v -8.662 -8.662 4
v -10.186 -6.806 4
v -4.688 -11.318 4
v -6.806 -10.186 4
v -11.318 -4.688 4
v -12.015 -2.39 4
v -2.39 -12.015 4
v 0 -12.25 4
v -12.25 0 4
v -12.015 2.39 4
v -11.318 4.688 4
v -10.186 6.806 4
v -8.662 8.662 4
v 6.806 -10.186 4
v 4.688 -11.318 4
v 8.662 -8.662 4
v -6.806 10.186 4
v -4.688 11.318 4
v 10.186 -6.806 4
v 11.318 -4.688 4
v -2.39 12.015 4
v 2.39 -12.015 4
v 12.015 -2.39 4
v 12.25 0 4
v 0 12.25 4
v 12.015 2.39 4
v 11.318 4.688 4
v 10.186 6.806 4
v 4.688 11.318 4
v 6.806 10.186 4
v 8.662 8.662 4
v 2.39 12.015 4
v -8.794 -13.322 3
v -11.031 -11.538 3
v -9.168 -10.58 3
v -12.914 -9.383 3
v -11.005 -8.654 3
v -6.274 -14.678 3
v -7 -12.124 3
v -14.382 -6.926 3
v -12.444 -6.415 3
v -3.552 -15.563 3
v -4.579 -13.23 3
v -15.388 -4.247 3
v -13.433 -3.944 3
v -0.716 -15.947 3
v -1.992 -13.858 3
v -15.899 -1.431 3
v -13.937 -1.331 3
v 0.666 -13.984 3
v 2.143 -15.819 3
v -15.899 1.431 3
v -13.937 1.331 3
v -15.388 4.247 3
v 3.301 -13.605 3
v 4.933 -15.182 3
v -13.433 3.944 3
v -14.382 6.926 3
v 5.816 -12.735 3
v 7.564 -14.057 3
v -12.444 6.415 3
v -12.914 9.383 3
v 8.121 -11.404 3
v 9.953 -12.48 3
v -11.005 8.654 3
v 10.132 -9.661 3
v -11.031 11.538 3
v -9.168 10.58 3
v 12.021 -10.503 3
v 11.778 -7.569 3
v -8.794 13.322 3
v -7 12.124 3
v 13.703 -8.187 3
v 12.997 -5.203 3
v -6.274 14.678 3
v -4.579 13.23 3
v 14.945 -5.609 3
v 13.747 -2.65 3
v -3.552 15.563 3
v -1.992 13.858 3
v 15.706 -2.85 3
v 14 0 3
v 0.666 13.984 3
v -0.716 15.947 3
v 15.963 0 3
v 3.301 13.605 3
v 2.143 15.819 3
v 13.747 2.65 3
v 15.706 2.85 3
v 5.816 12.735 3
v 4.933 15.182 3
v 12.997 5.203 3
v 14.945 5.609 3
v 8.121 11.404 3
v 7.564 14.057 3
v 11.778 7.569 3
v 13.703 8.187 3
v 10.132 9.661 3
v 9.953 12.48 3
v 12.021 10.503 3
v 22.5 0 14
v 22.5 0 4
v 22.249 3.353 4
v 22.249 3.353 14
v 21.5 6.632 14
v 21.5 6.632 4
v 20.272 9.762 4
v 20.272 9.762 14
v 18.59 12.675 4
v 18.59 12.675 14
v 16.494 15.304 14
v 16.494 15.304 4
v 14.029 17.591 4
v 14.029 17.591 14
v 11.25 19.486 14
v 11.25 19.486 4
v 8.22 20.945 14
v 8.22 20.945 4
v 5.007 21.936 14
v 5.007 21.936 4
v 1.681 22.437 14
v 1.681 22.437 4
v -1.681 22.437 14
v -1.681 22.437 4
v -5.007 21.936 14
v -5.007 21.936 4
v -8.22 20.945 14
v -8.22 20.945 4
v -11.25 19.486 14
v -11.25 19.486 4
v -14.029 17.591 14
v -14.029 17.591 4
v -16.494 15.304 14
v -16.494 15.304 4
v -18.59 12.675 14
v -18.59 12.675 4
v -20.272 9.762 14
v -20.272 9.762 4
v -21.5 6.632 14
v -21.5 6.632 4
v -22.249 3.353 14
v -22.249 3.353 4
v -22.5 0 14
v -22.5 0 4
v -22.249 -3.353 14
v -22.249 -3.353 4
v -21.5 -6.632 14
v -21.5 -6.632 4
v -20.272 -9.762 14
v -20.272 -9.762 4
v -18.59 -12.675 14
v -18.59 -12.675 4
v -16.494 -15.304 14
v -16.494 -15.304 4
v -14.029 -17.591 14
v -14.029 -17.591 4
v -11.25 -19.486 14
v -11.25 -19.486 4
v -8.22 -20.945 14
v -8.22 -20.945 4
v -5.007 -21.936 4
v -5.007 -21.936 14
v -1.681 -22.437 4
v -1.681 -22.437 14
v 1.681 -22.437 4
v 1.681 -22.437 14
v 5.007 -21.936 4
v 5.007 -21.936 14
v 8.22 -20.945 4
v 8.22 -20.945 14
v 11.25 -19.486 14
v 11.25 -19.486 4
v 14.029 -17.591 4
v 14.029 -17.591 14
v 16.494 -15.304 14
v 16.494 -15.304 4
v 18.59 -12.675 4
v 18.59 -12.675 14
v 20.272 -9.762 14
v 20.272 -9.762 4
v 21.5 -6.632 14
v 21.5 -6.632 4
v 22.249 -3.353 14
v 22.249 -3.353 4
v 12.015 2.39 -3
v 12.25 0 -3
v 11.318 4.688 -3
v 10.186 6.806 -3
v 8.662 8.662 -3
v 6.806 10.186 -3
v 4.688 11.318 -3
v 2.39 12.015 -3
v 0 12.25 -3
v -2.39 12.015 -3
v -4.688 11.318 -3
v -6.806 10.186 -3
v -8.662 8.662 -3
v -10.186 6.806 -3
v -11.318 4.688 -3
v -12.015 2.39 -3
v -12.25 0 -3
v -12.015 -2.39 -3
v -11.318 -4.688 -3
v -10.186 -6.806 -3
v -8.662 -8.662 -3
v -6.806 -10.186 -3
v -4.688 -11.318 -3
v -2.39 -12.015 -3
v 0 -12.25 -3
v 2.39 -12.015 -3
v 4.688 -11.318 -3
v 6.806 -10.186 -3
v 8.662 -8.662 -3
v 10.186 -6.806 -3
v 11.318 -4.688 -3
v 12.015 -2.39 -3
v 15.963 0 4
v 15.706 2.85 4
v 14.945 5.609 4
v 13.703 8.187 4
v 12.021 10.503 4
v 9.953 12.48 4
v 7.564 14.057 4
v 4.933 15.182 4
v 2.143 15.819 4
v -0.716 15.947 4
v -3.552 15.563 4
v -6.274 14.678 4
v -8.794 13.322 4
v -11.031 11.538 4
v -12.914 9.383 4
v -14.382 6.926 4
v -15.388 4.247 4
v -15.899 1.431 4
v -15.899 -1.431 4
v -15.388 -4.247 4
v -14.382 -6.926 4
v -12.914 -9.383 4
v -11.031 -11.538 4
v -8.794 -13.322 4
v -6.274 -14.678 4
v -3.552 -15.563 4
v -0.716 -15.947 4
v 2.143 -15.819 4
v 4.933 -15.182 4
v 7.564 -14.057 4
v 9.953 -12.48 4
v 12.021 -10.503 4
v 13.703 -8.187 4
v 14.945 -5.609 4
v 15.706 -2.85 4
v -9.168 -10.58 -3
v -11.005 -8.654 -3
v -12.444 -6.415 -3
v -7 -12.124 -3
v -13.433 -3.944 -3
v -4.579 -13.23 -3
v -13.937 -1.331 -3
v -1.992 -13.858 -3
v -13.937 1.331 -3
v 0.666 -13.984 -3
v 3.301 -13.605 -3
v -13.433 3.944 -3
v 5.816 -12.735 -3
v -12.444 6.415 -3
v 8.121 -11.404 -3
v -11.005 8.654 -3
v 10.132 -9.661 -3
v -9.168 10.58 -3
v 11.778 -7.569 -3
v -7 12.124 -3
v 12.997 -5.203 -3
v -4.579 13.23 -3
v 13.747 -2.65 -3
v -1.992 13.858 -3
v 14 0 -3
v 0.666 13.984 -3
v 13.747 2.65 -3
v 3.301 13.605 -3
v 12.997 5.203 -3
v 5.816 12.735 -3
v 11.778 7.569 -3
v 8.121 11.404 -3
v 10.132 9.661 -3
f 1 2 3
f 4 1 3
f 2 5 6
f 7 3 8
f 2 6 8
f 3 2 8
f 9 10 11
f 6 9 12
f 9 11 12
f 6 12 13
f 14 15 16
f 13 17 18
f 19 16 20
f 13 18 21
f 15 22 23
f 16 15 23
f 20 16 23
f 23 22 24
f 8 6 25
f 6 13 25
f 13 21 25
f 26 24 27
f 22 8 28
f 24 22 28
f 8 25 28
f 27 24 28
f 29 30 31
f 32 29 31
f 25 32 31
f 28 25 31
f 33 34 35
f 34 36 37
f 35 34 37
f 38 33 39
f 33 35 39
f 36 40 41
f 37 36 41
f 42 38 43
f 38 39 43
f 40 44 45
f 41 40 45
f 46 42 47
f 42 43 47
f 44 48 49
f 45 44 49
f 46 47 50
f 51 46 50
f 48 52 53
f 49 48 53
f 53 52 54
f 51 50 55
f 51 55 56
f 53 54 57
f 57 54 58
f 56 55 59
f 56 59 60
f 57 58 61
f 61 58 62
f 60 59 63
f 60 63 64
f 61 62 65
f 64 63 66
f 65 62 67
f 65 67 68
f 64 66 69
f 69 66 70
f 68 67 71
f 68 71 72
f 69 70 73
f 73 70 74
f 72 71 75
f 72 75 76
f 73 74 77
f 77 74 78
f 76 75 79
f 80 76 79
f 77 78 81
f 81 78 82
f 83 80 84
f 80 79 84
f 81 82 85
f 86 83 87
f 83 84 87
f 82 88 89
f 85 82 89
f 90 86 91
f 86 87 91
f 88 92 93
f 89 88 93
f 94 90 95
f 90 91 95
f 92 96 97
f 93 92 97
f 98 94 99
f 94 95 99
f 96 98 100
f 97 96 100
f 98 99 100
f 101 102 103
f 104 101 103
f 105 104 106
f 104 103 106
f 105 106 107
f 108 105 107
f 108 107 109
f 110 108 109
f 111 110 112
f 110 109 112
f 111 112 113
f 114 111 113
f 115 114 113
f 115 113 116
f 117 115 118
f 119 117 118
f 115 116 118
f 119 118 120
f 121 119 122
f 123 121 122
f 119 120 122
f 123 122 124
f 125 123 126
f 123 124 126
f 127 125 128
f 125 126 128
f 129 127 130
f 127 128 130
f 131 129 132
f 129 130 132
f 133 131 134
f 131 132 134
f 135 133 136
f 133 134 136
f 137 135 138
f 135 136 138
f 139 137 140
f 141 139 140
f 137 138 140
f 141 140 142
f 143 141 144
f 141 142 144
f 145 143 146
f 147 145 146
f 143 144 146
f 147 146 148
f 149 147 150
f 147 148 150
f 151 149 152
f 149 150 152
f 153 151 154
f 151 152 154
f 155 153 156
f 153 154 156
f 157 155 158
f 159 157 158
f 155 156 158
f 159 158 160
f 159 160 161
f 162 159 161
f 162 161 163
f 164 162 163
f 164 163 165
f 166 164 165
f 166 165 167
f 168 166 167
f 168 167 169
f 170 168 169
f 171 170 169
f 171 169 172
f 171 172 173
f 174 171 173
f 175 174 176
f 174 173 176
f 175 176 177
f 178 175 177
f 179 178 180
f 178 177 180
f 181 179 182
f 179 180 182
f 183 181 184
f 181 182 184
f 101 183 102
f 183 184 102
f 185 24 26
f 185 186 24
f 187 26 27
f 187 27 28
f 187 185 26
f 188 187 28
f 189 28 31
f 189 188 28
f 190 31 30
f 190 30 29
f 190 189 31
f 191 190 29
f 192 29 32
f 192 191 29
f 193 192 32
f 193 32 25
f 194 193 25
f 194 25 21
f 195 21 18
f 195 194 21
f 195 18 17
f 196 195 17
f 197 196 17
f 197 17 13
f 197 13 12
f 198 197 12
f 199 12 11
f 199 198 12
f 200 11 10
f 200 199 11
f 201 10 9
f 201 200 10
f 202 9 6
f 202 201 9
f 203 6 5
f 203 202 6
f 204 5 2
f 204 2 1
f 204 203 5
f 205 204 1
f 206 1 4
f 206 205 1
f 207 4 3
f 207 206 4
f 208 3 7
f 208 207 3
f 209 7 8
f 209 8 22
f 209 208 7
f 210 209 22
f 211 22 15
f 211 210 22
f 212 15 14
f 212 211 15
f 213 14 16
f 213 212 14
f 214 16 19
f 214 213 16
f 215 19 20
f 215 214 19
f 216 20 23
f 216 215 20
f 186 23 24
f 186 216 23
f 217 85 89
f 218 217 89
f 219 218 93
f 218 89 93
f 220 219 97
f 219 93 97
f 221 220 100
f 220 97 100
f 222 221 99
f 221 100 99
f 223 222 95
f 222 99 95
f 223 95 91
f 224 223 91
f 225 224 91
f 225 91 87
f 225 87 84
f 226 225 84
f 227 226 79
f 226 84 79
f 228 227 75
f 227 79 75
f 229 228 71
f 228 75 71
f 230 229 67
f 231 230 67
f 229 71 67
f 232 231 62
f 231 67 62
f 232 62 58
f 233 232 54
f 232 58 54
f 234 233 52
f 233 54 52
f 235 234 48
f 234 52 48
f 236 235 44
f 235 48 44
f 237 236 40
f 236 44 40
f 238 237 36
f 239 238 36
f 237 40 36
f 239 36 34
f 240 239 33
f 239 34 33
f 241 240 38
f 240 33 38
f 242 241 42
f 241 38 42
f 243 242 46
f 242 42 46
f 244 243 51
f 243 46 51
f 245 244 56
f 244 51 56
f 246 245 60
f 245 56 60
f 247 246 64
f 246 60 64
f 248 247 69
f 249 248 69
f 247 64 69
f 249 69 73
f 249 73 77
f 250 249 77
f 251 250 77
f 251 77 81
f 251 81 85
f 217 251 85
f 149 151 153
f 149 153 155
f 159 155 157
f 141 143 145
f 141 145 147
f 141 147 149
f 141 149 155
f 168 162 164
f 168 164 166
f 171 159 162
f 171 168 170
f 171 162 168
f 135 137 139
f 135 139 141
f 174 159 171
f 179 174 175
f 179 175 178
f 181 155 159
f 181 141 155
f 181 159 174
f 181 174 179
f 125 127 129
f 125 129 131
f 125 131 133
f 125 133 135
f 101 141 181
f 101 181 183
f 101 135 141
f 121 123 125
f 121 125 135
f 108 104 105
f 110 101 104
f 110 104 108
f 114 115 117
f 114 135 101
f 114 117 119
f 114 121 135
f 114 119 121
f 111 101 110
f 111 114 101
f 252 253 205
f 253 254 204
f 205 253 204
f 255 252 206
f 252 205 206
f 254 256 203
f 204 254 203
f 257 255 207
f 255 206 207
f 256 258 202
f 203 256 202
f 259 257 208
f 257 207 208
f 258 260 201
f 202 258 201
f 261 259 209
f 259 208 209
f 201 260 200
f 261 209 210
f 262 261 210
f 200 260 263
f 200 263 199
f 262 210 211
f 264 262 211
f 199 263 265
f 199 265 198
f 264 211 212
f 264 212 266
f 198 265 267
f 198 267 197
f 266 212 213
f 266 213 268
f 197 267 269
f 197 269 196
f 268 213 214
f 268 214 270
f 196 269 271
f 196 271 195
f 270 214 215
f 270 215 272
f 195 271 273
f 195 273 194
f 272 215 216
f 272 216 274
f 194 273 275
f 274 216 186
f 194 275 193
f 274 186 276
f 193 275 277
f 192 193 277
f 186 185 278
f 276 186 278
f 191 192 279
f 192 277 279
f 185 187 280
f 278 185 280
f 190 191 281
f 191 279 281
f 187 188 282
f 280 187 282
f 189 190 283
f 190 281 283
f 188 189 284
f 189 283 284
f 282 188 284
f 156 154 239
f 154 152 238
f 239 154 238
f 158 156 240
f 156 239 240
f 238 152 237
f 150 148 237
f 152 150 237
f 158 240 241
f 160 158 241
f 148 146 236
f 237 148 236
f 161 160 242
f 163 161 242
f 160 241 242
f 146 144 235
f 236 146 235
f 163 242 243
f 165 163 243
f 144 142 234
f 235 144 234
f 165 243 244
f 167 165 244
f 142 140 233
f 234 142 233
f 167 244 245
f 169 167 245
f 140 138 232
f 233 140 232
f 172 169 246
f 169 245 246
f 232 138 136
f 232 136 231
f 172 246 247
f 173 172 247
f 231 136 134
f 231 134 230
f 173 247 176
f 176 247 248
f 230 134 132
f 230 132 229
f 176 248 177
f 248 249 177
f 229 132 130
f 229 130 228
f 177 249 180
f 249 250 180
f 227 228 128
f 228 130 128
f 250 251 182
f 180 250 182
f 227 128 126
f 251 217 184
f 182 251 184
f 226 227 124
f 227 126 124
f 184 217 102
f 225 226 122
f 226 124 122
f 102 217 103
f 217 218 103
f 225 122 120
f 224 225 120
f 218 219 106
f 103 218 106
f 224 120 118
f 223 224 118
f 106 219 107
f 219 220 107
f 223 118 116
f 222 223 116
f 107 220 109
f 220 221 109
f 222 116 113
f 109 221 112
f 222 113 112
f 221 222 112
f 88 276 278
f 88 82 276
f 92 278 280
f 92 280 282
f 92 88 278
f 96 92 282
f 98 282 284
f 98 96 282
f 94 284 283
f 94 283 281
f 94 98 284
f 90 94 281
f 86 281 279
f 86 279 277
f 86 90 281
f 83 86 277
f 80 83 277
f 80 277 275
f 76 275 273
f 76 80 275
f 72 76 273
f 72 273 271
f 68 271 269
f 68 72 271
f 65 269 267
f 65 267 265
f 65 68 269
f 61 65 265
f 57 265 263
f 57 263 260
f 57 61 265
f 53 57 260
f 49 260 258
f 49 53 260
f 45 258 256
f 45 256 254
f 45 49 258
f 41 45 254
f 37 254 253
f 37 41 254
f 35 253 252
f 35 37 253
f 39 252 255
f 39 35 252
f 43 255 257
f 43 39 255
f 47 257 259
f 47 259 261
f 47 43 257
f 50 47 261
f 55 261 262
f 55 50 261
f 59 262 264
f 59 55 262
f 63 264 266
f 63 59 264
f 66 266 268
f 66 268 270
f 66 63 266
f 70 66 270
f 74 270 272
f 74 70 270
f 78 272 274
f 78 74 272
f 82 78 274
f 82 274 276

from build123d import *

# Parameters (mm, degrees)
SKETCH_1_R      = 14
SKETCH_1_R_2    = 12.25
EXTRUDE_1_DEPTH = 3
SKETCH_2_R      = 15.963029432
SKETCH_2_R_2    = 12.25
EXTRUDE_2_DEPTH = 1
SKETCH_3_R      = 22.5
EXTRUDE_3_DEPTH = 10


with BuildPart() as part:
    # 草图1 → 凸台-拉伸1 (new, symmetric)
    with BuildSketch(Plane.XY):
        Circle(SKETCH_1_R)
        Circle(SKETCH_1_R_2, mode=Mode.SUBTRACT)
    extrude(amount=EXTRUDE_1_DEPTH, both=True)

    # 草图2 → 凸台-拉伸2 (add)
    with BuildSketch(Plane.XY.offset(3)):
        Circle(SKETCH_2_R)
        Circle(SKETCH_2_R_2, mode=Mode.SUBTRACT)
    extrude(amount=EXTRUDE_2_DEPTH)

    # 草图3 → 凸台-拉伸3 (add)
    with BuildSketch(Plane.XY.offset(4)):
        Circle(SKETCH_3_R)
    extrude(amount=EXTRUDE_3_DEPTH)


solid = part.part
